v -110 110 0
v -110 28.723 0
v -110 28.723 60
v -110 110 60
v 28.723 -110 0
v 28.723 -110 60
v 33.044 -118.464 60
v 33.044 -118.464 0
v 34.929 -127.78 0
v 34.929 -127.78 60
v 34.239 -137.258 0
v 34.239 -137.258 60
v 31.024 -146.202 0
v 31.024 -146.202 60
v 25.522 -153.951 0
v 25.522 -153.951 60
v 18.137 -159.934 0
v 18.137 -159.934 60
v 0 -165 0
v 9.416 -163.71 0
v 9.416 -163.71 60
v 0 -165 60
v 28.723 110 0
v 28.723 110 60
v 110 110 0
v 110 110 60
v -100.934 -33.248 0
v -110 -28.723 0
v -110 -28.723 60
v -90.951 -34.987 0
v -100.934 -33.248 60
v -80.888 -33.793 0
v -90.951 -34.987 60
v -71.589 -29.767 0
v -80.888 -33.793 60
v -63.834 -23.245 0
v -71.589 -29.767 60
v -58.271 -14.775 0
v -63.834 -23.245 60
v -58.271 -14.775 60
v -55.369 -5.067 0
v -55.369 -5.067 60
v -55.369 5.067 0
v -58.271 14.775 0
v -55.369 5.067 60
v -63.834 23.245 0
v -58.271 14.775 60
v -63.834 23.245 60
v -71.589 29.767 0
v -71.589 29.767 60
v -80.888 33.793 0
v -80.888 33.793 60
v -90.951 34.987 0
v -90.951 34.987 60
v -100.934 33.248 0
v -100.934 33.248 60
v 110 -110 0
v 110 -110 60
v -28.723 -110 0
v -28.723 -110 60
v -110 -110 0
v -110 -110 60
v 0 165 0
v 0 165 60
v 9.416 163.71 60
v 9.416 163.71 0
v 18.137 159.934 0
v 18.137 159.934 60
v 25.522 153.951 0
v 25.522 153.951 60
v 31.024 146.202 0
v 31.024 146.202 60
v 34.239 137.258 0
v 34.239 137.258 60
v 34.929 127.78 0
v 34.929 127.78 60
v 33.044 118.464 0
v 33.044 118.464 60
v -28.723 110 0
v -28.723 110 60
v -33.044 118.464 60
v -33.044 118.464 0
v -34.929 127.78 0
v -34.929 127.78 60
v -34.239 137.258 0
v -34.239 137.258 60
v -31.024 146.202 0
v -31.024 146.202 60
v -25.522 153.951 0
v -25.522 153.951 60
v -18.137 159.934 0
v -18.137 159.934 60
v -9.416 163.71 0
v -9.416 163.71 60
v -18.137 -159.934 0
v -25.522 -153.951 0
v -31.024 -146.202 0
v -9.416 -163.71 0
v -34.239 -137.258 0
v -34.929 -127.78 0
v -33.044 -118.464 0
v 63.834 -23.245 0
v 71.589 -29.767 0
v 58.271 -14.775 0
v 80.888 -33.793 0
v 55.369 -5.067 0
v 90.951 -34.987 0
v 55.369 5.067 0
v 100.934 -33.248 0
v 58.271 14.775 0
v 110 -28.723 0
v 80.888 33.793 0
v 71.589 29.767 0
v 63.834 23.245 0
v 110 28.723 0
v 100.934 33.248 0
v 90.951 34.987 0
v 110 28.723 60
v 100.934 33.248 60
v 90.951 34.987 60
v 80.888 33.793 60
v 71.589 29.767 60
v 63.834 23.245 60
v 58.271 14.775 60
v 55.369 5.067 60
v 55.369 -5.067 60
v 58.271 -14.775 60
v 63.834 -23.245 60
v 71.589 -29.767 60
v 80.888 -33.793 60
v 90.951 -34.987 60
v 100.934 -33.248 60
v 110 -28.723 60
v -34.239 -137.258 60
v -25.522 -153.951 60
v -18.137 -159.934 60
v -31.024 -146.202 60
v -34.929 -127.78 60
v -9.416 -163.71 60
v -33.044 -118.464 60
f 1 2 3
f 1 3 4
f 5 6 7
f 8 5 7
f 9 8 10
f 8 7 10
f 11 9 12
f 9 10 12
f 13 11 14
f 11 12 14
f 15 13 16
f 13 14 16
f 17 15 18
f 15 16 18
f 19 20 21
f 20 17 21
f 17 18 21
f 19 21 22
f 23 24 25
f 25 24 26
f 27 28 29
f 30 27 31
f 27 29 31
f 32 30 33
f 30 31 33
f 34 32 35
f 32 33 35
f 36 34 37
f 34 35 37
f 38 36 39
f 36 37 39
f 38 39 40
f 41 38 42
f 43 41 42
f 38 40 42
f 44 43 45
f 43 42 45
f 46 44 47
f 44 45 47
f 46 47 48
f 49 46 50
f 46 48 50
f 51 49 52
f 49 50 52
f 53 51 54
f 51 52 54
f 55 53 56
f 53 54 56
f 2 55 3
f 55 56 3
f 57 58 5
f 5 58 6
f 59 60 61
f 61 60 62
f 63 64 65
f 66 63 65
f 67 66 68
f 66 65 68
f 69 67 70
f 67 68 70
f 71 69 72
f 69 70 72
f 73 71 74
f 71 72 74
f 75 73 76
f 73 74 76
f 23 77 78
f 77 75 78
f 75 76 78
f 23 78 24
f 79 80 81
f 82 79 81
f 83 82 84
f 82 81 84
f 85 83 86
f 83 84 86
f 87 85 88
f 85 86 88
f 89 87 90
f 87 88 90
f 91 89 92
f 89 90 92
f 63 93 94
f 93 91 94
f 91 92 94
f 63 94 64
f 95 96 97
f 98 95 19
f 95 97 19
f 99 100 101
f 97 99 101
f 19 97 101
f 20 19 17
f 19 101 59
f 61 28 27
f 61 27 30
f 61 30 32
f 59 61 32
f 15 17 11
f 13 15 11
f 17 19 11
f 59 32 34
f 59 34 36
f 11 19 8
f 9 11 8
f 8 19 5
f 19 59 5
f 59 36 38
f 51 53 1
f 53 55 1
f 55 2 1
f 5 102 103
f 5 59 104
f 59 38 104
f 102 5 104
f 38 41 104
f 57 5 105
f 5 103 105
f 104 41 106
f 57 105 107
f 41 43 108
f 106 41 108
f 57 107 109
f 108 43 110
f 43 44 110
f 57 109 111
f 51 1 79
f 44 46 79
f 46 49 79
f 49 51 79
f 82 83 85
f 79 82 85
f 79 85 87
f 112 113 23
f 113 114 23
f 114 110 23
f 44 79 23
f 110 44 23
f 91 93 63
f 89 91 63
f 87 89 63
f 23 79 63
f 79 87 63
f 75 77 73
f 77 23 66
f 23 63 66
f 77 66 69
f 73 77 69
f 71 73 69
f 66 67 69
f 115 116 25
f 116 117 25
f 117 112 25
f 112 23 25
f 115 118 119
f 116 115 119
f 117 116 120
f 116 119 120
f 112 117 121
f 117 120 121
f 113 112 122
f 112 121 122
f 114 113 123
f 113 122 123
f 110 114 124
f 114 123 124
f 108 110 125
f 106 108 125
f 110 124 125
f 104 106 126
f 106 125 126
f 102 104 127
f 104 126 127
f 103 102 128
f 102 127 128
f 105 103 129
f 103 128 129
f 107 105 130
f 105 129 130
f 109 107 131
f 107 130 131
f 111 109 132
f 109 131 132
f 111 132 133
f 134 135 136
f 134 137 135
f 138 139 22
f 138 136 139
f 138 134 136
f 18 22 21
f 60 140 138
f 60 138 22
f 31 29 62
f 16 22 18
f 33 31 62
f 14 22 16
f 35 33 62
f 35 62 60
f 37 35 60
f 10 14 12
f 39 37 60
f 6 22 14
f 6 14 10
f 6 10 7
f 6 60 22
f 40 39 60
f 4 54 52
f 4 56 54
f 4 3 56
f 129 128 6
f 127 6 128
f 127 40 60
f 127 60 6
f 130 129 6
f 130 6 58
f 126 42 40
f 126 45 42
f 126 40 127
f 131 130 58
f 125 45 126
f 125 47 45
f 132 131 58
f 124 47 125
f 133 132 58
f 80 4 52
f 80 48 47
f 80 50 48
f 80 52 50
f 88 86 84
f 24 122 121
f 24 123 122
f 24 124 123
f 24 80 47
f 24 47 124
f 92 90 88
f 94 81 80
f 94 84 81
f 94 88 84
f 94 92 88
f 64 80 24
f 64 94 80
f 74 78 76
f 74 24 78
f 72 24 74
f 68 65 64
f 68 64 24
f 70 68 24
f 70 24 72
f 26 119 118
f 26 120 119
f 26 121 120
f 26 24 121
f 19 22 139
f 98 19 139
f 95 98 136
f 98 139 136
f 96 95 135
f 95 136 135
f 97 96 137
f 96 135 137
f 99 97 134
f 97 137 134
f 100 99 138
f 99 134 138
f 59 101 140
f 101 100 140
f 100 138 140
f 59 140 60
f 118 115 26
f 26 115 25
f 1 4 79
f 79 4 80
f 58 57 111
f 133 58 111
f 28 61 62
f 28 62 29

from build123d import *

# Parameters (mm, degrees)
F0_W     = 220
F0_H     = 330
F1_DEPTH = 60
F3_DEPTH = 60.001
F4_R     = 35
F5_DEPTH = 60.001


with BuildPart() as f1:
    # F0 (on Top) → F1 (new body)
    with BuildSketch(Plane.XY):
        Rectangle(F0_W, F0_H)
    extrude(amount=F1_DEPTH)

    # F2 (on face) → F3 (cut, through all)
    with BuildSketch(Plane.XY.offset(60)):
        with BuildLine():
            ThreePointArc((-28.722813, 110), (-31.024184, 146.201852), (0, 165))
            Line((0, 165), (-110, 165))
            Line((-110, 165), (-110, 110))
            Line((-110, 110), (-28.722813, 110))
        make_face()
        with BuildLine():
            ThreePointArc((0, 165), (31.024184, 146.201852), (28.722813, 110))
            Line((28.722813, 110), (110, 110))
            Line((110, 110), (110, 165))
            Line((110, 165), (0, 165))
        make_face()
        with BuildLine():
            Line((110, -165), (110, -110))
            Line((110, -110), (28.722813, -110))
            ThreePointArc((28.722813, -110), (31.024184, -146.201852), (0, -165))
            Line((0, -165), (110, -165))
        make_face()
        with BuildLine():
            Line((-110, -165), (0, -165))
            ThreePointArc((0, -165), (-31.024184, -146.201852), (-28.722813, -110))
            Line((-28.722813, -110), (-110, -110))
            Line((-110, -110), (-110, -165))
        make_face()
    extrude(amount=-F3_DEPTH, mode=Mode.SUBTRACT)

    # F4 (on face) → F5 (cut, through all)
    with BuildSketch(Plane.XY.offset(60)):
        with Locations((-90, 0)):
            Circle(F4_R)
        with Locations((90, 0)):
            Circle(F4_R)
    extrude(amount=-F5_DEPTH, mode=Mode.SUBTRACT)


solid = f1.part
